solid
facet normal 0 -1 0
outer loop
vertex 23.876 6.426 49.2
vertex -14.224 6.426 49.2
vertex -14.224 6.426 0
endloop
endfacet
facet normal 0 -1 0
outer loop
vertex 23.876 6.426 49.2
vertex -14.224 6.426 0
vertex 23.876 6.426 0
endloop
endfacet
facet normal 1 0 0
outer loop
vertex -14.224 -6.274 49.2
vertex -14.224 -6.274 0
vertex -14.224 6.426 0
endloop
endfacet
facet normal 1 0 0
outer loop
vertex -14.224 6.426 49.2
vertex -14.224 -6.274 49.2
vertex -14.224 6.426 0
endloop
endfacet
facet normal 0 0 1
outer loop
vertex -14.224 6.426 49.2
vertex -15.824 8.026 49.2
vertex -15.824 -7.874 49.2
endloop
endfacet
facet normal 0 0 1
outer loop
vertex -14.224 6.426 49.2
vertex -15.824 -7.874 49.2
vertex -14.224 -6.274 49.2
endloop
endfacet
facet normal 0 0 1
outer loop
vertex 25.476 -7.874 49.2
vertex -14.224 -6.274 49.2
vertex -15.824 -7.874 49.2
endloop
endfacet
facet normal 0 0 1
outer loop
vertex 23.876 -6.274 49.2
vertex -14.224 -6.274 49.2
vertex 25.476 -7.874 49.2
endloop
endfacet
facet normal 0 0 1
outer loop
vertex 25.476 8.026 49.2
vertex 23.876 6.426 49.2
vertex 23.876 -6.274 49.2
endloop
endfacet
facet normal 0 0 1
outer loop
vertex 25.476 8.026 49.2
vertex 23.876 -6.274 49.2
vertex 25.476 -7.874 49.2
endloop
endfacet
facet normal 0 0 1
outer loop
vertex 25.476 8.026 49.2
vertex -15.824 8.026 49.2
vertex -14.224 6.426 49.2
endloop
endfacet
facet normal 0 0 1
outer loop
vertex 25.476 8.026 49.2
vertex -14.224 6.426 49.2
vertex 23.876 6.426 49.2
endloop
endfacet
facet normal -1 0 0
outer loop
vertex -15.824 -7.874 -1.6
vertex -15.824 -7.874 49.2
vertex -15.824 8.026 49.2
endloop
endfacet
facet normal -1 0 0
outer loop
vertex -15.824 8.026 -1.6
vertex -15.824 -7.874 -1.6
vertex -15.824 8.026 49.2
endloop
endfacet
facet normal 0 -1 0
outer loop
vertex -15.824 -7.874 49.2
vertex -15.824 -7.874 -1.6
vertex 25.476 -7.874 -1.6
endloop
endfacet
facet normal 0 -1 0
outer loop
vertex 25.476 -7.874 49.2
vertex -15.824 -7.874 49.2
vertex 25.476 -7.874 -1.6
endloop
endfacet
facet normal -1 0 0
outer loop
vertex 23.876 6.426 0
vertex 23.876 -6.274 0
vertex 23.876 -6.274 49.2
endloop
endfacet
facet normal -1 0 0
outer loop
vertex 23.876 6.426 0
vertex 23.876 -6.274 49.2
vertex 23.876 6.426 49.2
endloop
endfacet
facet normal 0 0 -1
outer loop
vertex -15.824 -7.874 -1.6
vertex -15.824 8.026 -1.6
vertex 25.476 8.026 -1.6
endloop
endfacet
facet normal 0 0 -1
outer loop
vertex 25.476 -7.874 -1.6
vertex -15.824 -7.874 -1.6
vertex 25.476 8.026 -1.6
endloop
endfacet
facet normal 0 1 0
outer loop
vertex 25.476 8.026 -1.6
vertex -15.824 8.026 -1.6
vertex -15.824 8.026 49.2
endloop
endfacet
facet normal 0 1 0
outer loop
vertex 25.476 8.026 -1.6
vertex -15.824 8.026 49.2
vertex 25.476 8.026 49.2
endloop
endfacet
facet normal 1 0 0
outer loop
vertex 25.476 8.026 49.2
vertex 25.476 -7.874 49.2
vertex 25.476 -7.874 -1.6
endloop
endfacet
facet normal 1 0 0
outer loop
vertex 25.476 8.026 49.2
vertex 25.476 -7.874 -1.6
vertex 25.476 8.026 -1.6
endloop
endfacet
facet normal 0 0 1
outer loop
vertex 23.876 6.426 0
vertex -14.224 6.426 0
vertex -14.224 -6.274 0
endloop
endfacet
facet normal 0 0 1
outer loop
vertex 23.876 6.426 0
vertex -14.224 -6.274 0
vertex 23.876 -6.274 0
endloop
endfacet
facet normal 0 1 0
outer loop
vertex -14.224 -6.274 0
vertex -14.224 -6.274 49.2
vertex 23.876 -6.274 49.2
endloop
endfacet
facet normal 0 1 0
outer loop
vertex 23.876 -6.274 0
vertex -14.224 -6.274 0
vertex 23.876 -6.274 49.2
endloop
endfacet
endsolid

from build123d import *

# Parameters (mm, degrees)
BOX001_W     = 38.1
BOX001_H     = 12.7
BOX001_DEPTH = 50.8
BOX002_W     = 41.3004
BOX002_H     = 15.9004
BOX002_DEPTH = 50.8


with BuildPart() as cube001:
    # Box001 → Box001 (new body)
    with BuildSketch(Plane(origin=(1.6002, 1.6002, 1.6002), x_dir=(1, 0, 0), z_dir=(0, 0, 1))):
        with Locations((19.05, 6.35)):
            Rectangle(BOX001_W, BOX001_H)
    extrude(amount=BOX001_DEPTH)


with BuildPart() as cut:
    # Box002 → Box002 (new body)
    with BuildSketch(Plane.XY):
        with Locations((20.6502, 7.9502)):
            Rectangle(BOX002_W, BOX002_H)
    extrude(amount=BOX002_DEPTH)

    # Cut: cut Cube001
    add(cube001.part, mode=Mode.SUBTRACT)


with BuildPart() as cut_1:
    # Cut placement: moved
    add(cut.part.moved(Location((-15.8242, -7.874, -1.6002))))


solid = cut_1.part
